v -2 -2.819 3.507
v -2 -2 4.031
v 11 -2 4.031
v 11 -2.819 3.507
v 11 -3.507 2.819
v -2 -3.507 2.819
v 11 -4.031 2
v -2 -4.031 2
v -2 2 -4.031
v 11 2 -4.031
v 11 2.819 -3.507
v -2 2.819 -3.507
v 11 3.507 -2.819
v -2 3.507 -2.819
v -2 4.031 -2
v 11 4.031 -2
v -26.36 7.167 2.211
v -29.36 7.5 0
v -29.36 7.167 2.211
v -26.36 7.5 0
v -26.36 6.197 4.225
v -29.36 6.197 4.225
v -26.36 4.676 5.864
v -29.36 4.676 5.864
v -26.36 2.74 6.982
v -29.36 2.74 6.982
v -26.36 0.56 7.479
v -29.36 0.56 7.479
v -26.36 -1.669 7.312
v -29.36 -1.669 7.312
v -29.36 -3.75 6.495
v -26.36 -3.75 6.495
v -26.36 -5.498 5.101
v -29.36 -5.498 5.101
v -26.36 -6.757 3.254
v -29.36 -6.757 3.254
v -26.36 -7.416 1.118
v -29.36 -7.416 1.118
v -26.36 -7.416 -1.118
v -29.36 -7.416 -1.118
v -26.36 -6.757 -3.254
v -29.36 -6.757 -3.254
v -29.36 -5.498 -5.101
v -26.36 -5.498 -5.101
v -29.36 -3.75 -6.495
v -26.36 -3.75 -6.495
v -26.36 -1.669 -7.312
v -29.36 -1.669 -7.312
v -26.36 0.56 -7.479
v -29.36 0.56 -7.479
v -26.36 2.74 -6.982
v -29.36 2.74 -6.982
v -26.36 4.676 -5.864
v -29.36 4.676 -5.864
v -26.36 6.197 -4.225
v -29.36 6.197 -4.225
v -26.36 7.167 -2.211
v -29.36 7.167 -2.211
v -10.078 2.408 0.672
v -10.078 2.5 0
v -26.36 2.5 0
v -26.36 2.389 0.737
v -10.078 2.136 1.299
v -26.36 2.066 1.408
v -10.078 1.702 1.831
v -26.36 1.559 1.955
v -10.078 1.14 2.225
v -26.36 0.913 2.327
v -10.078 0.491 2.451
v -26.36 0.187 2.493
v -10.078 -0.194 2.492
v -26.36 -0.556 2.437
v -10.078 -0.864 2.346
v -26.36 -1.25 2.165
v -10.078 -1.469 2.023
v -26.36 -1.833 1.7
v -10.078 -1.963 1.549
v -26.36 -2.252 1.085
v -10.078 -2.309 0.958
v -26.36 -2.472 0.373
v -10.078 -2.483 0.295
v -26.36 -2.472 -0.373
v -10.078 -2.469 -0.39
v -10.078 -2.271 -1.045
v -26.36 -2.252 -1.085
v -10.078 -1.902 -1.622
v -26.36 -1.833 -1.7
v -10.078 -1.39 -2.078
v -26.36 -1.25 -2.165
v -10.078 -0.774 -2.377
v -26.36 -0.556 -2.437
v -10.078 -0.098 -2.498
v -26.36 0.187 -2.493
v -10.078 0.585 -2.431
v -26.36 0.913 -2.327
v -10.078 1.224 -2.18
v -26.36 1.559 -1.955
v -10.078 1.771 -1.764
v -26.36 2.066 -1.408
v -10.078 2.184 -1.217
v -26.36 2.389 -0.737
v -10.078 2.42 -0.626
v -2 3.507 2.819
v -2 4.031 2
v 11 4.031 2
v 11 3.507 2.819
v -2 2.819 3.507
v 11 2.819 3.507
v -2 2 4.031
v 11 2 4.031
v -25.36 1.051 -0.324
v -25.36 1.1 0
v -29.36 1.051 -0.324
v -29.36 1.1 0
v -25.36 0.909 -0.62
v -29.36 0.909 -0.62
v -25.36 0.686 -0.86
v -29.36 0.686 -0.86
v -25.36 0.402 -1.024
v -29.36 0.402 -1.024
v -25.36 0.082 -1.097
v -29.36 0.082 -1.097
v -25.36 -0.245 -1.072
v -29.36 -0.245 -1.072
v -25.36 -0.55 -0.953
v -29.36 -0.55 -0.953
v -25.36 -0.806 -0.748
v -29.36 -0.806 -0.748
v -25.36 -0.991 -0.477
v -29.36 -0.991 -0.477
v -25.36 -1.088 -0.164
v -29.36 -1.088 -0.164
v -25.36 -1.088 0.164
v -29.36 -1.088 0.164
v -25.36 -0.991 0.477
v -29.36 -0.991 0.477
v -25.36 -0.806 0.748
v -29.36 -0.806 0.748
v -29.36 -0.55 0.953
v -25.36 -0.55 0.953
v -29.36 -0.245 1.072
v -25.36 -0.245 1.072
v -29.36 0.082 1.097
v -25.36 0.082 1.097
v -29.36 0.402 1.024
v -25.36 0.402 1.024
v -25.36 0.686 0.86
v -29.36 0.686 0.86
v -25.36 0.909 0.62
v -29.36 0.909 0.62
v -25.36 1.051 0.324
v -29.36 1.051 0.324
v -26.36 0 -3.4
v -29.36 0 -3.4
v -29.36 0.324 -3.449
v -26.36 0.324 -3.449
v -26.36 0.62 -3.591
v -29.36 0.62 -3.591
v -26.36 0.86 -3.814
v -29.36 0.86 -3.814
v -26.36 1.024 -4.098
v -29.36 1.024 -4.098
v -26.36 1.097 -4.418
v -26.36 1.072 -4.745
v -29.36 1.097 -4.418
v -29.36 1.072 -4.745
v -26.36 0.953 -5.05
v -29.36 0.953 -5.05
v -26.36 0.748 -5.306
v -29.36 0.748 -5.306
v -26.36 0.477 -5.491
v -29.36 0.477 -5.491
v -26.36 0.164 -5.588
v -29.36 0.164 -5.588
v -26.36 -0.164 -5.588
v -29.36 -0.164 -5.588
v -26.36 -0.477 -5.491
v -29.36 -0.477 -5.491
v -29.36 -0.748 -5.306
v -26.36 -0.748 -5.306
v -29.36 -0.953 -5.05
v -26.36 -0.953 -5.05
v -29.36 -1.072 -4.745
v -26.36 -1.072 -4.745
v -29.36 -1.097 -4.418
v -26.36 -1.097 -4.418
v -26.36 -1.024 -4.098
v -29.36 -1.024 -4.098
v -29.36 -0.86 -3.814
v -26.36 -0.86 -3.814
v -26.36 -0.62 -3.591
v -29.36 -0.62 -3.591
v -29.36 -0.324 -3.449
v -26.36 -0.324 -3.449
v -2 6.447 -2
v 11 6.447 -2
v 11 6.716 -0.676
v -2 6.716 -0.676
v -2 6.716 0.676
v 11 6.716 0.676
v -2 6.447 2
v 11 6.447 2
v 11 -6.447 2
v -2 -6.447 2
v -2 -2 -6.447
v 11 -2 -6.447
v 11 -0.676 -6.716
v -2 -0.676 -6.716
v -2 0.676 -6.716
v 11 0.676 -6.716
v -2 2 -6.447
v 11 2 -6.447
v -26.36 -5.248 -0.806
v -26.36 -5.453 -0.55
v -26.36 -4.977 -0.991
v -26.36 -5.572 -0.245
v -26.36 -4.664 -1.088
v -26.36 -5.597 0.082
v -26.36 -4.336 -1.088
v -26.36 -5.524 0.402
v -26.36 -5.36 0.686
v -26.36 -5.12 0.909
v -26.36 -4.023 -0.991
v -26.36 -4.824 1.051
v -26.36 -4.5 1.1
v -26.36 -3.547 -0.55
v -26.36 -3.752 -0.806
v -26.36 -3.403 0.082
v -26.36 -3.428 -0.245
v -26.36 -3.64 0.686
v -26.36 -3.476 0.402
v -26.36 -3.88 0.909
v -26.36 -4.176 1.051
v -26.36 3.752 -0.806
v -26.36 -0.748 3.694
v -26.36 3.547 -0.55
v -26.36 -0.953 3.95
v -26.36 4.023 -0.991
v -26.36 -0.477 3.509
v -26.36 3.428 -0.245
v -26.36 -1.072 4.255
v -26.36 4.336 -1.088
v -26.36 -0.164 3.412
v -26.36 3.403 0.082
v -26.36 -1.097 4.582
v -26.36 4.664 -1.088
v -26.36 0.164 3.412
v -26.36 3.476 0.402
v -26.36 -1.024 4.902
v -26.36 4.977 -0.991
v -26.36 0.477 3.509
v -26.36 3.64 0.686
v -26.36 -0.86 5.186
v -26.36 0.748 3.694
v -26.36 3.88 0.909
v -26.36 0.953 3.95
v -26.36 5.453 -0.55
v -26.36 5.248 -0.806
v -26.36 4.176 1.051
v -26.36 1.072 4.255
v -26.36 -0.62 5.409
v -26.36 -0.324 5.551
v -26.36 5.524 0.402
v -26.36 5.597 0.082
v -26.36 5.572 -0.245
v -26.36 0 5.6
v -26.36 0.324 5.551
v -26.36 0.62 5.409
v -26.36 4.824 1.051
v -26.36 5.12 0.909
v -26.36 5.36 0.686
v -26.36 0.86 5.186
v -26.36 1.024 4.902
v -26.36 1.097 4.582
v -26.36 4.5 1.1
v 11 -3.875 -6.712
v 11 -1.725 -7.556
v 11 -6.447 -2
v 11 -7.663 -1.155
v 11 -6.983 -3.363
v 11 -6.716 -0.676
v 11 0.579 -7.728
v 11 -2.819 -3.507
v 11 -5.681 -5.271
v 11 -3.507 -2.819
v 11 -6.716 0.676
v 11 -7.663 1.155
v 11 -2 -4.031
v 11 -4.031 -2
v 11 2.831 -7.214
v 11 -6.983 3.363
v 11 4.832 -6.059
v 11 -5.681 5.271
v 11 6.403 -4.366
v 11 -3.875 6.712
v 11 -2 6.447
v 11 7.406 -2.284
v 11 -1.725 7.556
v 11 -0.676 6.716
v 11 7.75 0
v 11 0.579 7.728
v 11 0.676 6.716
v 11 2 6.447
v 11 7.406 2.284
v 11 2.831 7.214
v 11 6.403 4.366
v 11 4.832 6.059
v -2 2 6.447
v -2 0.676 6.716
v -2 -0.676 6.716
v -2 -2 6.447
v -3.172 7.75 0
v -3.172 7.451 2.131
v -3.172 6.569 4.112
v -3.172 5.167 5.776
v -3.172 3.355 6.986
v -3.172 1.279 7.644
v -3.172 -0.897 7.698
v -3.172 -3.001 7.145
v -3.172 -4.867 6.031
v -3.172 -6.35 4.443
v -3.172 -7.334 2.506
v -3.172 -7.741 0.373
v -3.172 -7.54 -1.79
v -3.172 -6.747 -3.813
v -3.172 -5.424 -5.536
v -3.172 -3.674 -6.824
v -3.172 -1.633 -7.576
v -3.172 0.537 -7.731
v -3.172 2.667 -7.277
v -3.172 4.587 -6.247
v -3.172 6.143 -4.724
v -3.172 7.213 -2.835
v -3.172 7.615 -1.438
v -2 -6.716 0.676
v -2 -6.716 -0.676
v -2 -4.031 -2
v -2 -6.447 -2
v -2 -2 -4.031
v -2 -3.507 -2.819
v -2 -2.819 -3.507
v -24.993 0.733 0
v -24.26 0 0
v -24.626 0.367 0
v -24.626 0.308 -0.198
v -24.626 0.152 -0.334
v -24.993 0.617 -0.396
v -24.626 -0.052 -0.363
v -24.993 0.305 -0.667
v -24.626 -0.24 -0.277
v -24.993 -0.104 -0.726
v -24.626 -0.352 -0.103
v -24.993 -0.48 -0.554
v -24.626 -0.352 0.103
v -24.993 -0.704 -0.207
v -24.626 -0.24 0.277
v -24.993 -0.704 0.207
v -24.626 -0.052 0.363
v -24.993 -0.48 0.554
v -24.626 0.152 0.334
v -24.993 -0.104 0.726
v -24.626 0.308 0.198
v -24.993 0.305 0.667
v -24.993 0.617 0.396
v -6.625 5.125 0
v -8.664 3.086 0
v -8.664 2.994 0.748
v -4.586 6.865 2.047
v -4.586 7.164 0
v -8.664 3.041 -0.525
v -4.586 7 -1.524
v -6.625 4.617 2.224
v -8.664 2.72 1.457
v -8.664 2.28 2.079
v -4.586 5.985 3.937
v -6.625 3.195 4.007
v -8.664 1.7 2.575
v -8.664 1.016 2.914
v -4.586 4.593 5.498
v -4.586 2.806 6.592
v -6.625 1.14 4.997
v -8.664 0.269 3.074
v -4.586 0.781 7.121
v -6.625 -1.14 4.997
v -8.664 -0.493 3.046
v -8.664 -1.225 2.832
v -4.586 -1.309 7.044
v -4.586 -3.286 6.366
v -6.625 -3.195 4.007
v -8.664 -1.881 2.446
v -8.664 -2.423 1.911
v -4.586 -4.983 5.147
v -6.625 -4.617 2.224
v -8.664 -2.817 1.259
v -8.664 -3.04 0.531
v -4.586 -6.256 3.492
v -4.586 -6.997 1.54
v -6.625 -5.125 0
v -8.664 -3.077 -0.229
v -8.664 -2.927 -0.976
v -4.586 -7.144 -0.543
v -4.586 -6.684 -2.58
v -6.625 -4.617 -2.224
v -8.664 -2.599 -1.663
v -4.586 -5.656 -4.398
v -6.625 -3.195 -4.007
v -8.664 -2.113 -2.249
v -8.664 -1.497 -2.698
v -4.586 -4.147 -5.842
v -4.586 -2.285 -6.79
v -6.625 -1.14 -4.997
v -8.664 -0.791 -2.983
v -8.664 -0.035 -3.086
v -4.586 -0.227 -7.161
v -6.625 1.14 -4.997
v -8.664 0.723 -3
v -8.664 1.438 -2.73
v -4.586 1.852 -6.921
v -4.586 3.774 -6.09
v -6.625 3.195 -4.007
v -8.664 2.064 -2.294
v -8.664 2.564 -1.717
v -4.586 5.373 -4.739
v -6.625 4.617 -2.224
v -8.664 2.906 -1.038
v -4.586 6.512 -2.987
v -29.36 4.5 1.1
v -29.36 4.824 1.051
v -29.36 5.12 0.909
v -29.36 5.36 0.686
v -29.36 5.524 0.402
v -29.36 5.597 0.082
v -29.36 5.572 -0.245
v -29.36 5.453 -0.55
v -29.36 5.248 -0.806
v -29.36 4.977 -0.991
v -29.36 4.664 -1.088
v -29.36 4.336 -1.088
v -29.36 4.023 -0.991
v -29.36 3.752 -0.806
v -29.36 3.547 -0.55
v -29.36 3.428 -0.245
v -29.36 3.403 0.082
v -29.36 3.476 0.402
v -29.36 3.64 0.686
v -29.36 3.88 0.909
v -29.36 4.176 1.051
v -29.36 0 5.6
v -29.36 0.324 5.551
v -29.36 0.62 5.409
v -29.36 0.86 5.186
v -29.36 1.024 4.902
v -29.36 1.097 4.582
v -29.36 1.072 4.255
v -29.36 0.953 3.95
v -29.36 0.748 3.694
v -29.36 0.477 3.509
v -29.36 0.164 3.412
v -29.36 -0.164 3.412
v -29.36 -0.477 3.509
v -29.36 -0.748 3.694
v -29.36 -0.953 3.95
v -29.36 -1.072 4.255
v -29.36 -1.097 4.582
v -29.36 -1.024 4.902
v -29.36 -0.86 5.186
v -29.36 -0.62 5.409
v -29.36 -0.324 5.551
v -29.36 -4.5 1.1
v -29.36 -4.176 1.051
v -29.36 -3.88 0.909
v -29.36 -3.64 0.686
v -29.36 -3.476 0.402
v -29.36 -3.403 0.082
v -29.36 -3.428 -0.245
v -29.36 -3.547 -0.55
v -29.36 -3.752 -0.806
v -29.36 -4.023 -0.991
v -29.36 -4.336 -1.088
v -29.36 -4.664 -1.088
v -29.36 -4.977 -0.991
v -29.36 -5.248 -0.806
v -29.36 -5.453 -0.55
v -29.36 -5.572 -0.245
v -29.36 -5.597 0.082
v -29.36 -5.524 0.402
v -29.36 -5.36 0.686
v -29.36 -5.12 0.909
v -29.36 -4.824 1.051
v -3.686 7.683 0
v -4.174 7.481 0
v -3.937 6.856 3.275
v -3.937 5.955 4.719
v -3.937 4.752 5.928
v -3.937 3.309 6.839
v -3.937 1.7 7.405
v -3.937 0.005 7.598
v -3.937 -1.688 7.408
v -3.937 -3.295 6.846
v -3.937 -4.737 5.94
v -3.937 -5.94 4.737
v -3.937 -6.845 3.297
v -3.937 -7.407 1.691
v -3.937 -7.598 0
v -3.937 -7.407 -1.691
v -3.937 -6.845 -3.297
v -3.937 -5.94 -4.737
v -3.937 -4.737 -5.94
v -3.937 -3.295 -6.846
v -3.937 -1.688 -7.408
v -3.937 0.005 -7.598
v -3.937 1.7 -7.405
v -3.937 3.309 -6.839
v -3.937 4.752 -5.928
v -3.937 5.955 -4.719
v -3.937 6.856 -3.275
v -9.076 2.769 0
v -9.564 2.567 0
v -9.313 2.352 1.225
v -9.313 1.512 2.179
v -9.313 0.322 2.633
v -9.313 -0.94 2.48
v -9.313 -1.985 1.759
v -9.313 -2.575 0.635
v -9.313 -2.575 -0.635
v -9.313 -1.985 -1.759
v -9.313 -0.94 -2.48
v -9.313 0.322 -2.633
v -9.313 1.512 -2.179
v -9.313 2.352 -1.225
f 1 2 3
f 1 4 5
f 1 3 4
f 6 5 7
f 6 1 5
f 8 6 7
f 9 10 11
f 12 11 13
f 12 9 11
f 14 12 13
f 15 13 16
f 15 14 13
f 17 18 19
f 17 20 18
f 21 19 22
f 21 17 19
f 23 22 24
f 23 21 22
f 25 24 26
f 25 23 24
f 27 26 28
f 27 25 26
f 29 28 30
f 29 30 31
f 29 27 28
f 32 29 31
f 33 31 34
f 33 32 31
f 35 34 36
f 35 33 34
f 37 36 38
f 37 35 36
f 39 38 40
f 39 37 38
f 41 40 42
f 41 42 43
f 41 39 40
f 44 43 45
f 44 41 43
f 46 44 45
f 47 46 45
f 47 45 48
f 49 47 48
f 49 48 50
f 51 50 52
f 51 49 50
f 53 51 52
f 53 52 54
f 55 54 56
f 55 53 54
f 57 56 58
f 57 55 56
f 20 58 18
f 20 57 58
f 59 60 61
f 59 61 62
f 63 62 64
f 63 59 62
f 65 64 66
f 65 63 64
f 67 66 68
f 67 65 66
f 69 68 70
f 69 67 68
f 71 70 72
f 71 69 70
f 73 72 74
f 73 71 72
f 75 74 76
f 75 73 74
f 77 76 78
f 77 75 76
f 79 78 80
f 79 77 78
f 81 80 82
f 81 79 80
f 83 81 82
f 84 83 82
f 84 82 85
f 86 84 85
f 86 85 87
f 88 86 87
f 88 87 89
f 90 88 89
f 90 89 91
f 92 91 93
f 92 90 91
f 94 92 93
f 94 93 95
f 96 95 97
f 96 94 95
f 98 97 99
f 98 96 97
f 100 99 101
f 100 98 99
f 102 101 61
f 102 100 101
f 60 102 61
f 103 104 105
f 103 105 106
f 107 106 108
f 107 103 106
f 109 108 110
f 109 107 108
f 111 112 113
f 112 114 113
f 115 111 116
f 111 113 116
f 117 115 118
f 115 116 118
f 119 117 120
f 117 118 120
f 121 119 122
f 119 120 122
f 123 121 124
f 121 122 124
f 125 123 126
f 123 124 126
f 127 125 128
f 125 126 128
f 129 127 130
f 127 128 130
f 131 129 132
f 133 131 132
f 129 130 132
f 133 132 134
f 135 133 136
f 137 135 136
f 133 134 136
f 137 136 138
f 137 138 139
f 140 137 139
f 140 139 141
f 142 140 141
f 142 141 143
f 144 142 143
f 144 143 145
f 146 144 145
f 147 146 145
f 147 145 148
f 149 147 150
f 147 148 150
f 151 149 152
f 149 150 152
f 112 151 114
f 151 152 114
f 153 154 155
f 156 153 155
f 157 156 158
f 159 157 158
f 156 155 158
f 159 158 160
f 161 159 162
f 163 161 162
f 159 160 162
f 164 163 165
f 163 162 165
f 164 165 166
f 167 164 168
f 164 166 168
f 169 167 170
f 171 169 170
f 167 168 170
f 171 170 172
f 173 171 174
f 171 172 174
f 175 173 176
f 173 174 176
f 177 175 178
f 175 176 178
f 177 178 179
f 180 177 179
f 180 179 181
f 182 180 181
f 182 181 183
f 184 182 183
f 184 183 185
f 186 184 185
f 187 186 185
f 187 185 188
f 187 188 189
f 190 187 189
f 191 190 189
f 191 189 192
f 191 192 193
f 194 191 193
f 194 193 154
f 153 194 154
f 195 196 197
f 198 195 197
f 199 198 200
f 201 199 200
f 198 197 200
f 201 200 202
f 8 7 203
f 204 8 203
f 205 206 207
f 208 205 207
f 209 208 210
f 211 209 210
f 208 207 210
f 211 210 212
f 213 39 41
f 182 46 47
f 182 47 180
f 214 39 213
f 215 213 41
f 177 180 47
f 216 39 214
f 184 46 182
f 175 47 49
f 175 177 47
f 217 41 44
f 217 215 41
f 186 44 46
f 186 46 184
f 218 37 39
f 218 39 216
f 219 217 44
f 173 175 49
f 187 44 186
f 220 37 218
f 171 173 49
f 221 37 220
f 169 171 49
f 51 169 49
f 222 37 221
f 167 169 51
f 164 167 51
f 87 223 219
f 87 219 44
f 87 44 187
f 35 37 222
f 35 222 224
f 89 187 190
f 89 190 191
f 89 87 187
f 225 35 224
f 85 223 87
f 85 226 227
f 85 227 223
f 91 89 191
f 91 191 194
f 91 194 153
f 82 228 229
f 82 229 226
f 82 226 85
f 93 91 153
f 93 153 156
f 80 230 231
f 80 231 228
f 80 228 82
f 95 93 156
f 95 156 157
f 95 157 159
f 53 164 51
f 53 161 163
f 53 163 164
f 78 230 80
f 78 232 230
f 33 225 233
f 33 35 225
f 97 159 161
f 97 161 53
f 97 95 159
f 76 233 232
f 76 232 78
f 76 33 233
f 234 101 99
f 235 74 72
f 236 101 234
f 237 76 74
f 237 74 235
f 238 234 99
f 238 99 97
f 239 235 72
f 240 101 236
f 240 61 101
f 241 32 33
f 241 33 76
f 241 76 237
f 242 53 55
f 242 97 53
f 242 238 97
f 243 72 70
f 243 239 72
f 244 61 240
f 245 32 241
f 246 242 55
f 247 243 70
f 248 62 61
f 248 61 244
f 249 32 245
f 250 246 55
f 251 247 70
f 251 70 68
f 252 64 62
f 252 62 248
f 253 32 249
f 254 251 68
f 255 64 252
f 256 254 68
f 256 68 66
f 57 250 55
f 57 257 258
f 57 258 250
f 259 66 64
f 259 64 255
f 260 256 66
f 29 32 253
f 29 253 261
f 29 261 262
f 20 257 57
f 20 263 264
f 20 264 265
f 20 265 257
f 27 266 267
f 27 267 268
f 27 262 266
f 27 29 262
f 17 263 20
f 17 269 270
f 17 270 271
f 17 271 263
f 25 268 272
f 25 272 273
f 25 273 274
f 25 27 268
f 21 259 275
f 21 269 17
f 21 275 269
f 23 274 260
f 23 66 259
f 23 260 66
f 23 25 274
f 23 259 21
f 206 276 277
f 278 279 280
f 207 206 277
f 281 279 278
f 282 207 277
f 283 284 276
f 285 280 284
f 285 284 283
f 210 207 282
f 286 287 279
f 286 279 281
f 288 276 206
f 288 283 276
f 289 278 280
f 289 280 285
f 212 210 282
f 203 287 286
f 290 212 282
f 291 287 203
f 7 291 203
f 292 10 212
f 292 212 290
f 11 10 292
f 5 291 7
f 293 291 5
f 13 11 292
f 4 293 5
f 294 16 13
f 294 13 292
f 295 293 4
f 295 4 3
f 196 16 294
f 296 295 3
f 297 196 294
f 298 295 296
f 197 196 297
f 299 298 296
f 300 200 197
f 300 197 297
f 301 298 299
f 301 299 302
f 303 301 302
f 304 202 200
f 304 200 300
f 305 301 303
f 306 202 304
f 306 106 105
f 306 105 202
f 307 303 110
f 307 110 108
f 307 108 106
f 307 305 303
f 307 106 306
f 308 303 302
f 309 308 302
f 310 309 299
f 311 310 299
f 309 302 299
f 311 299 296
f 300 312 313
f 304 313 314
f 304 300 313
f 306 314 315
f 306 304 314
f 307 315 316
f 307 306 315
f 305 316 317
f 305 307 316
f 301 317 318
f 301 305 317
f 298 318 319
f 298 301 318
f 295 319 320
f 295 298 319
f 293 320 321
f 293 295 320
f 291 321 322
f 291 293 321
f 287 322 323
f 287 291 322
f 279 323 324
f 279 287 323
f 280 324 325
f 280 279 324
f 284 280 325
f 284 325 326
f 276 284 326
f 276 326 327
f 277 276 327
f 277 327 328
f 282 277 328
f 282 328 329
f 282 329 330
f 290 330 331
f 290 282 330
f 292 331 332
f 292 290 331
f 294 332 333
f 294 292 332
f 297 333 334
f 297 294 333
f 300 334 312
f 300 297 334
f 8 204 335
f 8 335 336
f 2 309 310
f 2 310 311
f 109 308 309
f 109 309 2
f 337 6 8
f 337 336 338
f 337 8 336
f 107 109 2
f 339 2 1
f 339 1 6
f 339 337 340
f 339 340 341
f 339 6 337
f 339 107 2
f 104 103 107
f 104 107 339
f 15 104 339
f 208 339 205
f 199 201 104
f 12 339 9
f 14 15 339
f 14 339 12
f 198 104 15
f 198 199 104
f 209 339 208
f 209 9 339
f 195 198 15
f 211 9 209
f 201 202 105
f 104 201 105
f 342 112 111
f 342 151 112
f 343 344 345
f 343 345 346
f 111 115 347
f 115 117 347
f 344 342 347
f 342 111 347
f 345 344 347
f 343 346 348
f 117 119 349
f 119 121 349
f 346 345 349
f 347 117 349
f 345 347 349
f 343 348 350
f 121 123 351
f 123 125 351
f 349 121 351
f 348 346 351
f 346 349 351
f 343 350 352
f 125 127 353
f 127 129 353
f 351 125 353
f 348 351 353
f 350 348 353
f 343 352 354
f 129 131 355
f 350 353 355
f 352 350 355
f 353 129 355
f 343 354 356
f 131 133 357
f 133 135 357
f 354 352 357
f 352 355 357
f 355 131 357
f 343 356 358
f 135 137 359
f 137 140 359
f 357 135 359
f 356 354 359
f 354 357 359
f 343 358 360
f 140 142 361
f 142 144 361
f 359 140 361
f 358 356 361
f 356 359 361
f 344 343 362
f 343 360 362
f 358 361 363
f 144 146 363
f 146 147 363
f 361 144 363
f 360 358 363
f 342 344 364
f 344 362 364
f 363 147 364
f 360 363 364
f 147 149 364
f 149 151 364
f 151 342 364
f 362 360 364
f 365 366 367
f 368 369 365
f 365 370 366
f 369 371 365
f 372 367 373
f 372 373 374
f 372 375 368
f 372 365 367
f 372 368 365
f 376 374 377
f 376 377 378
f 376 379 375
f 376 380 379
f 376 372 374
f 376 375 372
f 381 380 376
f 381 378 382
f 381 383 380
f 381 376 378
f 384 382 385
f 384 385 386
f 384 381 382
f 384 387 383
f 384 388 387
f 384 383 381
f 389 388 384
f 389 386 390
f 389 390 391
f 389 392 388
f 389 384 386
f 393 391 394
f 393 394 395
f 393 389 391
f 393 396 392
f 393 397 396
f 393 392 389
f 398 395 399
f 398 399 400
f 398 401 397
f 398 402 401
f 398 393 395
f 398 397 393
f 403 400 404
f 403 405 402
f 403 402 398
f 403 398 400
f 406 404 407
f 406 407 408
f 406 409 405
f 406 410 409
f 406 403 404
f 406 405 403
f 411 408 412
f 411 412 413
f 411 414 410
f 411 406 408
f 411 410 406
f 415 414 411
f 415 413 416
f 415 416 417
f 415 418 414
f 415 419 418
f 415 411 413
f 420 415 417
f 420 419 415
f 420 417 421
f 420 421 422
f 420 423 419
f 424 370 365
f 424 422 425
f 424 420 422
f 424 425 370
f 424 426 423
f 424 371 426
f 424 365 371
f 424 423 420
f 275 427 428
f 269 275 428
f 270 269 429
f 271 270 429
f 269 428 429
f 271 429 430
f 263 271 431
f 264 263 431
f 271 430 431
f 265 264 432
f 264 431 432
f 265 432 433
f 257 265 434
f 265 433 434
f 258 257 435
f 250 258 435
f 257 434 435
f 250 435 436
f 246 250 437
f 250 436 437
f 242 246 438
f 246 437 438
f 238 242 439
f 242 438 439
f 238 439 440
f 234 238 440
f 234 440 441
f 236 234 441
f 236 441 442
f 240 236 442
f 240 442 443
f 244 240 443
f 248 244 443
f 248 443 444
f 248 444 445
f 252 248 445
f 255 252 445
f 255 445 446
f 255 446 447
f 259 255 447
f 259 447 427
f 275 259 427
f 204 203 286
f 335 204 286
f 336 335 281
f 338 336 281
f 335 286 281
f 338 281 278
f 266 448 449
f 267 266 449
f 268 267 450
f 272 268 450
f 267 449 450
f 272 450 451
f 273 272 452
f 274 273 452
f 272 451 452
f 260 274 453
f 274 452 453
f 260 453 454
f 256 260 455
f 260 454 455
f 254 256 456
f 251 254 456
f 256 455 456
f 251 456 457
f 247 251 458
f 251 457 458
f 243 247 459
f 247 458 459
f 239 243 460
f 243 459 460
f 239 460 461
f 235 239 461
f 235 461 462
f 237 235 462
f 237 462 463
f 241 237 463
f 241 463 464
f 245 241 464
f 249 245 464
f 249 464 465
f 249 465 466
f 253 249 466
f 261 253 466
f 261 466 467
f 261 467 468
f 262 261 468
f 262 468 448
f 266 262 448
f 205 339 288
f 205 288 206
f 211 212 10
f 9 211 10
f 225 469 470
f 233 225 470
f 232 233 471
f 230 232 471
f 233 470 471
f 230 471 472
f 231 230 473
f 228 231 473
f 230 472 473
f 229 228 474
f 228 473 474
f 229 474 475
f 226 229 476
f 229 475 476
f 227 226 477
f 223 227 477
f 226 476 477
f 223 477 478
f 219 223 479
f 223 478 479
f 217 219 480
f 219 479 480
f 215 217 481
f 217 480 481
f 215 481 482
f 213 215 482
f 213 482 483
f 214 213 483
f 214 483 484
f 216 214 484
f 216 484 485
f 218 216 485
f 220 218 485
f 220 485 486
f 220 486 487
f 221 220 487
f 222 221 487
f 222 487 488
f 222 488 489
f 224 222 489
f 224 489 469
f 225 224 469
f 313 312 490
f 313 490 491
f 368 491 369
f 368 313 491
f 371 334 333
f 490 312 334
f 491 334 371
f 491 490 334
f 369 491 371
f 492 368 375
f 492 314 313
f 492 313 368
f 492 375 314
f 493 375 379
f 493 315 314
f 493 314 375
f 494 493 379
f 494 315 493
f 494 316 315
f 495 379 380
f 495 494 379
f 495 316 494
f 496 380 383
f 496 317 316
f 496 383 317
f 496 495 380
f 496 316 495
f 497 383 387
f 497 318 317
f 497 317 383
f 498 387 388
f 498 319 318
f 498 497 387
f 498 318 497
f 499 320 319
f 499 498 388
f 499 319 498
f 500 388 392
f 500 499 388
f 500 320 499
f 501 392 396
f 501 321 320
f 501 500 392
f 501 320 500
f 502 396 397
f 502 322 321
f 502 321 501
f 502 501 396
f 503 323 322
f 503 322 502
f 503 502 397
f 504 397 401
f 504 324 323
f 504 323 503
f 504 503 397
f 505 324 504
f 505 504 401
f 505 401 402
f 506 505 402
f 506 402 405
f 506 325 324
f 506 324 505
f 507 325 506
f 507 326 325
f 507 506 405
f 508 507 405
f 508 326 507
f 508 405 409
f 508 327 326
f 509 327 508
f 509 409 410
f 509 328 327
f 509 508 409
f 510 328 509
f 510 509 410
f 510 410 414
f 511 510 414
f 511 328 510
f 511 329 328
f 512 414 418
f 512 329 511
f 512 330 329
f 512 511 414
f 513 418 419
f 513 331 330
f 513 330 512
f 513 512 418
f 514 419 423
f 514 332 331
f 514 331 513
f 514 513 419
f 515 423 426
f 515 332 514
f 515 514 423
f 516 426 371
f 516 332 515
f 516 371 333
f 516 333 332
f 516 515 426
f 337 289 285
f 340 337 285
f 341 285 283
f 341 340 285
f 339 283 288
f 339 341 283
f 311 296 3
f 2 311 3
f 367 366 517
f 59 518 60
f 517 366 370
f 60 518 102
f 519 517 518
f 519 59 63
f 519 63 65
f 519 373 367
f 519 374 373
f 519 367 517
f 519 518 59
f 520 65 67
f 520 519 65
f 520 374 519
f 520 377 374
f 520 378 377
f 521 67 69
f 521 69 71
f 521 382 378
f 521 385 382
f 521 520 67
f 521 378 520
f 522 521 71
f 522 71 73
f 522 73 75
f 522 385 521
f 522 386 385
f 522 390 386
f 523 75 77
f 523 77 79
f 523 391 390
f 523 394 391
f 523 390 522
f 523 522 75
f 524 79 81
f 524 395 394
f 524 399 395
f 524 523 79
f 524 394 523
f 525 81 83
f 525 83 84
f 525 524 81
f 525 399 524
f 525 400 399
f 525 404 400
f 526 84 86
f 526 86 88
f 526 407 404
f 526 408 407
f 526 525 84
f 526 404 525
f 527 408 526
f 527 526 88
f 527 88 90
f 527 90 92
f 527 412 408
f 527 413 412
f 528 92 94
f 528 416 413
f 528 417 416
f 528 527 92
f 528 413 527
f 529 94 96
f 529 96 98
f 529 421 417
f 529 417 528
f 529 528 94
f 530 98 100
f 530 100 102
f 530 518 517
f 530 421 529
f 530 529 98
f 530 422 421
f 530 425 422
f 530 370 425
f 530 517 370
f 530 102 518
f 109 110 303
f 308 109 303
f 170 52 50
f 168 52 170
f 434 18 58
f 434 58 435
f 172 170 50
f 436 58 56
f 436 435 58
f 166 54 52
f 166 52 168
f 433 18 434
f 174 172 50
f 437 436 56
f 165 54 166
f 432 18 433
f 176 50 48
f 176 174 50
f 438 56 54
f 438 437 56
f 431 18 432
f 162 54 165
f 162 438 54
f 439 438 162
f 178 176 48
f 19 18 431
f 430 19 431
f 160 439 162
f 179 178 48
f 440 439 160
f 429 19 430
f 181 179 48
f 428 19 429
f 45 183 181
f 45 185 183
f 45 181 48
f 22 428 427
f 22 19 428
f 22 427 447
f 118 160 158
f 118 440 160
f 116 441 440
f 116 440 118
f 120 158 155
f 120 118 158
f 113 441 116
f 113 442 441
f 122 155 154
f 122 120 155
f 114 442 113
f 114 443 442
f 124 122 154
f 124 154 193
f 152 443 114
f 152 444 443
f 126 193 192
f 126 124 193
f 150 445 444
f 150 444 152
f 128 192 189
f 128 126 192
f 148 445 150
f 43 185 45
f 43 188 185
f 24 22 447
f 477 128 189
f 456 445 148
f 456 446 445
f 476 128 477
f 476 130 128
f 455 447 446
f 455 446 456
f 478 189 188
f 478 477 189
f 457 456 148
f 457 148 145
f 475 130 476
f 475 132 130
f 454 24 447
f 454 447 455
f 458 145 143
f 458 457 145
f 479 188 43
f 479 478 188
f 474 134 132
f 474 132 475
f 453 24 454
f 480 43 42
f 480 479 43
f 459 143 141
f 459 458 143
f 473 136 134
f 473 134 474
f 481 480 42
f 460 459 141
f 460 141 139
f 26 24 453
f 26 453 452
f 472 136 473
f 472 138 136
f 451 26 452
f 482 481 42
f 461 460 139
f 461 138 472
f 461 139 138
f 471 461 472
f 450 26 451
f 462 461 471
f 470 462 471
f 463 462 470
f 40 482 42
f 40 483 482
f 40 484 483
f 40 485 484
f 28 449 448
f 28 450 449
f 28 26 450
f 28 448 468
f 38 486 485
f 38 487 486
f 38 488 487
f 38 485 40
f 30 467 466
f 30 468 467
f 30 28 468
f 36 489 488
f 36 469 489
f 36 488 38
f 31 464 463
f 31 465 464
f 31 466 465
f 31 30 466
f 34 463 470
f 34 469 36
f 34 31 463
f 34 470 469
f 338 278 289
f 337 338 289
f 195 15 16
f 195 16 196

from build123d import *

# Parameters (mm, degrees)
CUT_EXTRUDE1_DEPTH = 13
CIRPATTERN1_COUNT  = 4
SKETCH3_R          = 4.5
CUT_EXTRUDE2_DEPTH = 14
CUT_EXTRUDE3_REACH = 42.36
SKETCH4_R          = 1.1
FILLET1_R          = 2


with BuildPart() as part:
    # Sketch1 → Revolve1 (revolve)
    with BuildSketch(Plane.XY):
        Polygon((-4, 7.75), (11, 7.75), (11, 0), (-29.35982328, 0), (-29.35982328, 7.5), (-26.35982328, 7.5), (-26.35982328, 2.5), (-9.25, 2.5), align=None)
    revolve(axis=Axis((0, 0, 0), (1, 0, 0)))

    # Sketch2 → Cut-Extrude1 (cut)
    with BuildSketch(Plane(origin=(11, 0, 0), x_dir=(0, 0, -1), z_dir=(1, 0, 0))):
        with BuildLine():
            Line((-2, 0), (2, 0))
            Line((2, 0), (2, 6.446898479))
            ThreePointArc((2, 6.446898479), (0, 6.75), (-2, 6.446898479))
            Line((-2, 6.446898479), (-2, 0))
        make_face()
    cut_extrude1 = extrude(amount=-CUT_EXTRUDE1_DEPTH, mode=Mode.SUBTRACT)

    # CirPattern1: Cut-Extrude1 ×4 about axis
    cirpattern1_axis = Axis((0, 0, 0), (1, 0, 0))
    for i in range(1, CIRPATTERN1_COUNT):
        add(cut_extrude1.rotate(cirpattern1_axis, i * 360 / CIRPATTERN1_COUNT), mode=Mode.SUBTRACT)

    # Sketch3 → Cut-Extrude2 (cut, through all)
    with BuildSketch(Plane(origin=(-2, 0, 0), x_dir=(0, 0, -1), z_dir=(1, 0, 0))):
        Circle(SKETCH3_R)
    extrude(amount=CUT_EXTRUDE2_DEPTH, mode=Mode.SUBTRACT)

    # Sketch4 → Cut-Extrude3 (cut, up to next)
    with BuildSketch(Plane.ZY.offset(29.35982328), mode=Mode.PRIVATE) as cut_extrude3_sk1:
        with Locations((0, 4.5)):
            Circle(SKETCH4_R)
    cut_extrude3_tool1 = extrude(cut_extrude3_sk1.sketch, amount=-CUT_EXTRUDE3_REACH, mode=Mode.PRIVATE) & part.part
    add(cut_extrude3_tool1.solids().sort_by_distance((-29.359823, 4.5, 0))[0], mode=Mode.SUBTRACT)
    # Sketch4 → Cut-Extrude3 (cut, up to next)
    with BuildSketch(Plane.ZY.offset(29.35982328), mode=Mode.PRIVATE) as cut_extrude3_sk2:
        with Locations((4.5, 0)):
            Circle(SKETCH4_R)
    cut_extrude3_tool2 = extrude(cut_extrude3_sk2.sketch, amount=-CUT_EXTRUDE3_REACH, mode=Mode.PRIVATE) & part.part
    add(cut_extrude3_tool2.solids().sort_by_distance((-29.359823, 0, 4.5))[0], mode=Mode.SUBTRACT)
    # Sketch4 → Cut-Extrude3 (cut, up to next)
    with BuildSketch(Plane.ZY.offset(29.35982328), mode=Mode.PRIVATE) as cut_extrude3_sk3:
        with Locations((0, -4.5)):
            Circle(SKETCH4_R)
    cut_extrude3_tool3 = extrude(cut_extrude3_sk3.sketch, amount=-CUT_EXTRUDE3_REACH, mode=Mode.PRIVATE) & part.part
    add(cut_extrude3_tool3.solids().sort_by_distance((-29.359823, -4.5, 0))[0], mode=Mode.SUBTRACT)
    # Sketch4 → Cut-Extrude3 (cut, up to next)
    with BuildSketch(Plane.ZY.offset(29.35982328), mode=Mode.PRIVATE) as cut_extrude3_sk4:
        with Locations((-4.5, 0)):
            Circle(SKETCH4_R)
    cut_extrude3_tool4 = extrude(cut_extrude3_sk4.sketch, amount=-CUT_EXTRUDE3_REACH, mode=Mode.PRIVATE) & part.part
    add(cut_extrude3_tool4.solids().sort_by_distance((-29.359823, 0, -4.5))[0], mode=Mode.SUBTRACT)

    # Fillet1
    fillet1_edges = [part.edges().sort_by_distance(p)[0] for p in [
        (-9.25, -2.5, 0),
        (-4, -7.75, 0),
    ]]
    fillet(fillet1_edges, radius=FILLET1_R)

    # Sketch5 → Cut-Revolve1 (revolve, cut)
    with BuildSketch(Plane.XY):
        Polygon((-29.35982328, 0), (-24.25982328, 0), (-25.35982328, 1.1), (-29.35982328, 1.1), align=None)
    revolve(axis=Axis((-29.35982328, 0, 0), (-1, 0, 0)), mode=Mode.SUBTRACT)


solid = part.part
